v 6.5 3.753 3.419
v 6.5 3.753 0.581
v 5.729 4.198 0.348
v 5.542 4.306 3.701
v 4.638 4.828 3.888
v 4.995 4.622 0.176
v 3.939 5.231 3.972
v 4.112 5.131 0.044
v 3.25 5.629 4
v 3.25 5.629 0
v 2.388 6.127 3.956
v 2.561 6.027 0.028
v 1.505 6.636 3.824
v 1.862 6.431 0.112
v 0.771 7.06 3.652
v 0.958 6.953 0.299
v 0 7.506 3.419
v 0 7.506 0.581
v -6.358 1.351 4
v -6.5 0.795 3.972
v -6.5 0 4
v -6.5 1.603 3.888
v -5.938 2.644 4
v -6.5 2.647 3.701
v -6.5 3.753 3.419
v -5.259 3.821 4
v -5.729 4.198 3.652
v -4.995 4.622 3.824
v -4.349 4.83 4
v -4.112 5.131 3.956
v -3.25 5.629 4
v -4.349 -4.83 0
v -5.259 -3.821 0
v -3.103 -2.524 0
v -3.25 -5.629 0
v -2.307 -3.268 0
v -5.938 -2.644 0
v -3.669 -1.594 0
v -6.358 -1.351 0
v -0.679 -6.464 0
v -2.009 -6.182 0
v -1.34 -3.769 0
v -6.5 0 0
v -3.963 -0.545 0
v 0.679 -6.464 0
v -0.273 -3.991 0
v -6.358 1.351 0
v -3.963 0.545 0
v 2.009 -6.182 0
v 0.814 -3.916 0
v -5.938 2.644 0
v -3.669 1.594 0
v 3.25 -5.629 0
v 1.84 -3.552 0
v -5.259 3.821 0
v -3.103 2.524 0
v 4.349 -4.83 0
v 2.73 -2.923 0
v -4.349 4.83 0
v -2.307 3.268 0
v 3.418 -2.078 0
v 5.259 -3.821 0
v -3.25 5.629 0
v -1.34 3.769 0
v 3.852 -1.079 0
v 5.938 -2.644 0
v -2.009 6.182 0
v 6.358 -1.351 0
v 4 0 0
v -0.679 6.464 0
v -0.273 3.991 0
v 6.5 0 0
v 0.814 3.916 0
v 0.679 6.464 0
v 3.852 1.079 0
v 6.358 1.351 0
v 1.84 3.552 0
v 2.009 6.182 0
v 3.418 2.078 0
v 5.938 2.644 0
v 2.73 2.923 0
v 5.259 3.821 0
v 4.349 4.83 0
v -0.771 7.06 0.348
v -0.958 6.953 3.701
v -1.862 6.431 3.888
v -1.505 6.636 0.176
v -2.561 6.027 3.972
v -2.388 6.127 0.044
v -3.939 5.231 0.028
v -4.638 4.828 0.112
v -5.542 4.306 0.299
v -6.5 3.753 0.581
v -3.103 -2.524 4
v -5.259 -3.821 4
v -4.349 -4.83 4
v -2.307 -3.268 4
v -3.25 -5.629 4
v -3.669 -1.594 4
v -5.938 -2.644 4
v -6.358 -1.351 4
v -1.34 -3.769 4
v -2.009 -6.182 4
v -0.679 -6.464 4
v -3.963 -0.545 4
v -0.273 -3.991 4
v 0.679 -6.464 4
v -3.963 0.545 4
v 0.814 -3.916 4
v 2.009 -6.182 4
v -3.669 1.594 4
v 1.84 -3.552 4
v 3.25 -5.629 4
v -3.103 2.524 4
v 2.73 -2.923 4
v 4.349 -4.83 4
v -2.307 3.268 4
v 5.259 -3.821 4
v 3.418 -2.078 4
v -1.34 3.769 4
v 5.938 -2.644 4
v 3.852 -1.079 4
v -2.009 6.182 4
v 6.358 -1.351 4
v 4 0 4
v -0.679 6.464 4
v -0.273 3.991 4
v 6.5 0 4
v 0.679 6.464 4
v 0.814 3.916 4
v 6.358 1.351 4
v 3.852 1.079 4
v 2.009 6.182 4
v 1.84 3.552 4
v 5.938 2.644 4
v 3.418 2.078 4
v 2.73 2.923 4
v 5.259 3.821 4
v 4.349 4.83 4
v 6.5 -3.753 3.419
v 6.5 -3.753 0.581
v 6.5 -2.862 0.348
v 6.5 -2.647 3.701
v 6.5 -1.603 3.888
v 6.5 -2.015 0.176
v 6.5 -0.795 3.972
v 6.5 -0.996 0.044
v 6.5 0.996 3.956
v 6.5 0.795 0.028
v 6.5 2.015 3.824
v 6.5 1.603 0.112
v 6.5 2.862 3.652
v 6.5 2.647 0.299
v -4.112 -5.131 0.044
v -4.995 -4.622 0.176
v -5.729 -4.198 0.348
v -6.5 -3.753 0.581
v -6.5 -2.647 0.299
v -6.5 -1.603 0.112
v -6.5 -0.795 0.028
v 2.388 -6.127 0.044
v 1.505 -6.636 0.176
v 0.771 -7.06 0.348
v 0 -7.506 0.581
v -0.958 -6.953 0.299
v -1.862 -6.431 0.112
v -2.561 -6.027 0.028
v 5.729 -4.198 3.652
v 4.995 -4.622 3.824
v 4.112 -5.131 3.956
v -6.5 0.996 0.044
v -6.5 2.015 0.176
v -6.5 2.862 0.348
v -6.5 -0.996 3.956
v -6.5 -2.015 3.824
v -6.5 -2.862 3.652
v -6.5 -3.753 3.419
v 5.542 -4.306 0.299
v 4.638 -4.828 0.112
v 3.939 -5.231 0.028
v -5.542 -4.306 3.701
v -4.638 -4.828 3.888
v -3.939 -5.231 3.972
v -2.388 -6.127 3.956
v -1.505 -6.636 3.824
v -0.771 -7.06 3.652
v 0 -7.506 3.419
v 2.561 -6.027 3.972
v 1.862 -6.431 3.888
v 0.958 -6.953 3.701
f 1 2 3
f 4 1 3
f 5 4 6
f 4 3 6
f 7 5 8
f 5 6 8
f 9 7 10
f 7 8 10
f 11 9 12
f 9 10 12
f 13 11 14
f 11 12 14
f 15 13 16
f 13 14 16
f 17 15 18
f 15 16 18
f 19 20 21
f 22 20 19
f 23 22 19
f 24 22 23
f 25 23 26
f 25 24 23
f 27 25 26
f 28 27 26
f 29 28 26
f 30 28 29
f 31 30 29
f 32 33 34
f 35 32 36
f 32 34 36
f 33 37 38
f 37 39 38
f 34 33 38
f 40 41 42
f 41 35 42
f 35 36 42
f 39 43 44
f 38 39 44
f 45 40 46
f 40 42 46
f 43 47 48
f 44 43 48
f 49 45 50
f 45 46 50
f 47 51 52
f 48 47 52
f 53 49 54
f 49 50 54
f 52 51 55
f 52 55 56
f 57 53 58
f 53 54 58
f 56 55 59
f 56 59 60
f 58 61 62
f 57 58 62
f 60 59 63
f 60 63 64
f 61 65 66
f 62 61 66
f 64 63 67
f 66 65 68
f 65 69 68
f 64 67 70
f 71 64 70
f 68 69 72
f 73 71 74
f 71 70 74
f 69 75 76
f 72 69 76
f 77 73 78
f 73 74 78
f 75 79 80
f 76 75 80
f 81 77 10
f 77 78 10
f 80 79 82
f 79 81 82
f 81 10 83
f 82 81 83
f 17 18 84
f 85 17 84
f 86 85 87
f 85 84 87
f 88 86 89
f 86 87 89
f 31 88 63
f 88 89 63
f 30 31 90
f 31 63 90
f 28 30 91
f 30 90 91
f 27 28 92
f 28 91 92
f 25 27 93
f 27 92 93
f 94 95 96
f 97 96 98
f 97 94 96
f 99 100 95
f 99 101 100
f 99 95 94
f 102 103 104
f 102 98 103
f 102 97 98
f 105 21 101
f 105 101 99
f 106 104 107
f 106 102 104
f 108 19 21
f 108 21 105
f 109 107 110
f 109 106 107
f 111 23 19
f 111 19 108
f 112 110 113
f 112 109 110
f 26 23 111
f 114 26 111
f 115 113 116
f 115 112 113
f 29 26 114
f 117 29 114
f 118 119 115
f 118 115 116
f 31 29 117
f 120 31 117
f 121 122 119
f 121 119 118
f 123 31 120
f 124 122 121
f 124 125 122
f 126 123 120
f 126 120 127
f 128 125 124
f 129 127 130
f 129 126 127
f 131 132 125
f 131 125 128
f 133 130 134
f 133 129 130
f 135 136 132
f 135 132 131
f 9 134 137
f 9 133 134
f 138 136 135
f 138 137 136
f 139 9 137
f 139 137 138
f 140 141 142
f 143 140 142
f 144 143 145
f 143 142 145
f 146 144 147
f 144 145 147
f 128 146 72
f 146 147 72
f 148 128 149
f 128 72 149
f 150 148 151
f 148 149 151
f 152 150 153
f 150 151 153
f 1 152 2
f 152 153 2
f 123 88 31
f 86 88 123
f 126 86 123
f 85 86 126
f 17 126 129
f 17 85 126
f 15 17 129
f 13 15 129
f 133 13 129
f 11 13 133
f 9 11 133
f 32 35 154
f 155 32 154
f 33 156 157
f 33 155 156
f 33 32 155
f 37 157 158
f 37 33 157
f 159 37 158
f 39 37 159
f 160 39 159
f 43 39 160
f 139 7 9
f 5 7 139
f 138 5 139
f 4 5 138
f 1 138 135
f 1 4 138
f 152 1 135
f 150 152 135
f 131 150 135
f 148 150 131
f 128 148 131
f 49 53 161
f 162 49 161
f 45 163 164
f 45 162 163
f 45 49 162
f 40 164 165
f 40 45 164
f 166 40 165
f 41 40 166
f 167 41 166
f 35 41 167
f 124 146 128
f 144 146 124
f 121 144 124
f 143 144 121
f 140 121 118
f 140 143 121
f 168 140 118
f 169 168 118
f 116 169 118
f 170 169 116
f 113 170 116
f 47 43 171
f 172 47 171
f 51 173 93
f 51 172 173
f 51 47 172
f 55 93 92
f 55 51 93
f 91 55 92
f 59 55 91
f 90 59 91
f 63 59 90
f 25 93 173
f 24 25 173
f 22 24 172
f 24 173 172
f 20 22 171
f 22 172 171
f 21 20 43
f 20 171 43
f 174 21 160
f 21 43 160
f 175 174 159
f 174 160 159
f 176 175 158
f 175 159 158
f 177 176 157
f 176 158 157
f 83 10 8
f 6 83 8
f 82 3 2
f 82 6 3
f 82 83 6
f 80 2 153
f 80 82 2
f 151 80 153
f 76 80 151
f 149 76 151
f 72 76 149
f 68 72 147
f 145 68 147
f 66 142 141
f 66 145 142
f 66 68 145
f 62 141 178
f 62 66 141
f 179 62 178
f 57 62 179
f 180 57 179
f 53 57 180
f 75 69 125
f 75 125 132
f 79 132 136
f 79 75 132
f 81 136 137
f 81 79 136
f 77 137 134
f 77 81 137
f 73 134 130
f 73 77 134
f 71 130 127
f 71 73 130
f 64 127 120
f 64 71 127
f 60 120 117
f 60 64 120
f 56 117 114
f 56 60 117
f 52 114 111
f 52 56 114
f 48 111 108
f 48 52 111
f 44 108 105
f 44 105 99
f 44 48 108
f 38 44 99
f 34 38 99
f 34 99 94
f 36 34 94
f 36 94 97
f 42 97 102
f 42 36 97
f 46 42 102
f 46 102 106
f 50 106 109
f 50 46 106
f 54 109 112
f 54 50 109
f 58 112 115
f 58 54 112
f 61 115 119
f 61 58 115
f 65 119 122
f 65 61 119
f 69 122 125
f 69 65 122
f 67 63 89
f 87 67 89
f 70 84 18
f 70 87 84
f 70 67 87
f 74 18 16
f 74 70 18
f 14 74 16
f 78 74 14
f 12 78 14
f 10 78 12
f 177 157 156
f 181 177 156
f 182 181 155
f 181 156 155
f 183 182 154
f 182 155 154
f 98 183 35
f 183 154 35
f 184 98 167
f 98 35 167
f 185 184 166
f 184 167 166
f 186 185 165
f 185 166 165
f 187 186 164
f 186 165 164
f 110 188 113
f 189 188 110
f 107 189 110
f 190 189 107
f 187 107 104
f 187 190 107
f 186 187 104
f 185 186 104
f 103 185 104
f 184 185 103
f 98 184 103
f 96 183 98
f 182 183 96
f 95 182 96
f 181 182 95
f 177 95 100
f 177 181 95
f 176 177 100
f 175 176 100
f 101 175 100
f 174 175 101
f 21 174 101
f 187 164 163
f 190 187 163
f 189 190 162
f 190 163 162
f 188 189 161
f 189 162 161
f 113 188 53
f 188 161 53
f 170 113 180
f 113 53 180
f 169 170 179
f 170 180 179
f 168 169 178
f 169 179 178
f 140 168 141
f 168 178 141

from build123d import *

# Parameters (mm, degrees)
SZKIC1_R                    = 4
DODANIE_WYCI_GNI_CIE1_DEPTH = 4


with BuildPart() as part:
    # Szkic1 → Dodanie-wyciągnięcie1 (new body)
    with BuildSketch(Plane.XY):
        Polygon((6.5, 3.75277675), (0, 7.505553499), (-6.5, 3.75277675), (-6.5, -3.75277675), (0, -7.505553499), (6.5, -3.75277675), align=None)
        Circle(SZKIC1_R, mode=Mode.SUBTRACT)
    extrude(amount=DODANIE_WYCI_GNI_CIE1_DEPTH)

    # Szkic2 → Wycięcie-obrót1 (revolve, cut)
    with BuildSketch(Plane(origin=(0, 0, 0), x_dir=(1, 0, 0), z_dir=(0, 1, 0))):
        Polygon((-9.964101615, -4), (-6.5, -4), (-9.964101615, -2), align=None)
        Polygon((-9.964101615, -2), (-6.5, 0), (-9.964101615, 0), align=None)
    revolve(axis=Axis((0, 0, 9.891098034), (0, 0, -1)), mode=Mode.SUBTRACT)


solid = part.part
